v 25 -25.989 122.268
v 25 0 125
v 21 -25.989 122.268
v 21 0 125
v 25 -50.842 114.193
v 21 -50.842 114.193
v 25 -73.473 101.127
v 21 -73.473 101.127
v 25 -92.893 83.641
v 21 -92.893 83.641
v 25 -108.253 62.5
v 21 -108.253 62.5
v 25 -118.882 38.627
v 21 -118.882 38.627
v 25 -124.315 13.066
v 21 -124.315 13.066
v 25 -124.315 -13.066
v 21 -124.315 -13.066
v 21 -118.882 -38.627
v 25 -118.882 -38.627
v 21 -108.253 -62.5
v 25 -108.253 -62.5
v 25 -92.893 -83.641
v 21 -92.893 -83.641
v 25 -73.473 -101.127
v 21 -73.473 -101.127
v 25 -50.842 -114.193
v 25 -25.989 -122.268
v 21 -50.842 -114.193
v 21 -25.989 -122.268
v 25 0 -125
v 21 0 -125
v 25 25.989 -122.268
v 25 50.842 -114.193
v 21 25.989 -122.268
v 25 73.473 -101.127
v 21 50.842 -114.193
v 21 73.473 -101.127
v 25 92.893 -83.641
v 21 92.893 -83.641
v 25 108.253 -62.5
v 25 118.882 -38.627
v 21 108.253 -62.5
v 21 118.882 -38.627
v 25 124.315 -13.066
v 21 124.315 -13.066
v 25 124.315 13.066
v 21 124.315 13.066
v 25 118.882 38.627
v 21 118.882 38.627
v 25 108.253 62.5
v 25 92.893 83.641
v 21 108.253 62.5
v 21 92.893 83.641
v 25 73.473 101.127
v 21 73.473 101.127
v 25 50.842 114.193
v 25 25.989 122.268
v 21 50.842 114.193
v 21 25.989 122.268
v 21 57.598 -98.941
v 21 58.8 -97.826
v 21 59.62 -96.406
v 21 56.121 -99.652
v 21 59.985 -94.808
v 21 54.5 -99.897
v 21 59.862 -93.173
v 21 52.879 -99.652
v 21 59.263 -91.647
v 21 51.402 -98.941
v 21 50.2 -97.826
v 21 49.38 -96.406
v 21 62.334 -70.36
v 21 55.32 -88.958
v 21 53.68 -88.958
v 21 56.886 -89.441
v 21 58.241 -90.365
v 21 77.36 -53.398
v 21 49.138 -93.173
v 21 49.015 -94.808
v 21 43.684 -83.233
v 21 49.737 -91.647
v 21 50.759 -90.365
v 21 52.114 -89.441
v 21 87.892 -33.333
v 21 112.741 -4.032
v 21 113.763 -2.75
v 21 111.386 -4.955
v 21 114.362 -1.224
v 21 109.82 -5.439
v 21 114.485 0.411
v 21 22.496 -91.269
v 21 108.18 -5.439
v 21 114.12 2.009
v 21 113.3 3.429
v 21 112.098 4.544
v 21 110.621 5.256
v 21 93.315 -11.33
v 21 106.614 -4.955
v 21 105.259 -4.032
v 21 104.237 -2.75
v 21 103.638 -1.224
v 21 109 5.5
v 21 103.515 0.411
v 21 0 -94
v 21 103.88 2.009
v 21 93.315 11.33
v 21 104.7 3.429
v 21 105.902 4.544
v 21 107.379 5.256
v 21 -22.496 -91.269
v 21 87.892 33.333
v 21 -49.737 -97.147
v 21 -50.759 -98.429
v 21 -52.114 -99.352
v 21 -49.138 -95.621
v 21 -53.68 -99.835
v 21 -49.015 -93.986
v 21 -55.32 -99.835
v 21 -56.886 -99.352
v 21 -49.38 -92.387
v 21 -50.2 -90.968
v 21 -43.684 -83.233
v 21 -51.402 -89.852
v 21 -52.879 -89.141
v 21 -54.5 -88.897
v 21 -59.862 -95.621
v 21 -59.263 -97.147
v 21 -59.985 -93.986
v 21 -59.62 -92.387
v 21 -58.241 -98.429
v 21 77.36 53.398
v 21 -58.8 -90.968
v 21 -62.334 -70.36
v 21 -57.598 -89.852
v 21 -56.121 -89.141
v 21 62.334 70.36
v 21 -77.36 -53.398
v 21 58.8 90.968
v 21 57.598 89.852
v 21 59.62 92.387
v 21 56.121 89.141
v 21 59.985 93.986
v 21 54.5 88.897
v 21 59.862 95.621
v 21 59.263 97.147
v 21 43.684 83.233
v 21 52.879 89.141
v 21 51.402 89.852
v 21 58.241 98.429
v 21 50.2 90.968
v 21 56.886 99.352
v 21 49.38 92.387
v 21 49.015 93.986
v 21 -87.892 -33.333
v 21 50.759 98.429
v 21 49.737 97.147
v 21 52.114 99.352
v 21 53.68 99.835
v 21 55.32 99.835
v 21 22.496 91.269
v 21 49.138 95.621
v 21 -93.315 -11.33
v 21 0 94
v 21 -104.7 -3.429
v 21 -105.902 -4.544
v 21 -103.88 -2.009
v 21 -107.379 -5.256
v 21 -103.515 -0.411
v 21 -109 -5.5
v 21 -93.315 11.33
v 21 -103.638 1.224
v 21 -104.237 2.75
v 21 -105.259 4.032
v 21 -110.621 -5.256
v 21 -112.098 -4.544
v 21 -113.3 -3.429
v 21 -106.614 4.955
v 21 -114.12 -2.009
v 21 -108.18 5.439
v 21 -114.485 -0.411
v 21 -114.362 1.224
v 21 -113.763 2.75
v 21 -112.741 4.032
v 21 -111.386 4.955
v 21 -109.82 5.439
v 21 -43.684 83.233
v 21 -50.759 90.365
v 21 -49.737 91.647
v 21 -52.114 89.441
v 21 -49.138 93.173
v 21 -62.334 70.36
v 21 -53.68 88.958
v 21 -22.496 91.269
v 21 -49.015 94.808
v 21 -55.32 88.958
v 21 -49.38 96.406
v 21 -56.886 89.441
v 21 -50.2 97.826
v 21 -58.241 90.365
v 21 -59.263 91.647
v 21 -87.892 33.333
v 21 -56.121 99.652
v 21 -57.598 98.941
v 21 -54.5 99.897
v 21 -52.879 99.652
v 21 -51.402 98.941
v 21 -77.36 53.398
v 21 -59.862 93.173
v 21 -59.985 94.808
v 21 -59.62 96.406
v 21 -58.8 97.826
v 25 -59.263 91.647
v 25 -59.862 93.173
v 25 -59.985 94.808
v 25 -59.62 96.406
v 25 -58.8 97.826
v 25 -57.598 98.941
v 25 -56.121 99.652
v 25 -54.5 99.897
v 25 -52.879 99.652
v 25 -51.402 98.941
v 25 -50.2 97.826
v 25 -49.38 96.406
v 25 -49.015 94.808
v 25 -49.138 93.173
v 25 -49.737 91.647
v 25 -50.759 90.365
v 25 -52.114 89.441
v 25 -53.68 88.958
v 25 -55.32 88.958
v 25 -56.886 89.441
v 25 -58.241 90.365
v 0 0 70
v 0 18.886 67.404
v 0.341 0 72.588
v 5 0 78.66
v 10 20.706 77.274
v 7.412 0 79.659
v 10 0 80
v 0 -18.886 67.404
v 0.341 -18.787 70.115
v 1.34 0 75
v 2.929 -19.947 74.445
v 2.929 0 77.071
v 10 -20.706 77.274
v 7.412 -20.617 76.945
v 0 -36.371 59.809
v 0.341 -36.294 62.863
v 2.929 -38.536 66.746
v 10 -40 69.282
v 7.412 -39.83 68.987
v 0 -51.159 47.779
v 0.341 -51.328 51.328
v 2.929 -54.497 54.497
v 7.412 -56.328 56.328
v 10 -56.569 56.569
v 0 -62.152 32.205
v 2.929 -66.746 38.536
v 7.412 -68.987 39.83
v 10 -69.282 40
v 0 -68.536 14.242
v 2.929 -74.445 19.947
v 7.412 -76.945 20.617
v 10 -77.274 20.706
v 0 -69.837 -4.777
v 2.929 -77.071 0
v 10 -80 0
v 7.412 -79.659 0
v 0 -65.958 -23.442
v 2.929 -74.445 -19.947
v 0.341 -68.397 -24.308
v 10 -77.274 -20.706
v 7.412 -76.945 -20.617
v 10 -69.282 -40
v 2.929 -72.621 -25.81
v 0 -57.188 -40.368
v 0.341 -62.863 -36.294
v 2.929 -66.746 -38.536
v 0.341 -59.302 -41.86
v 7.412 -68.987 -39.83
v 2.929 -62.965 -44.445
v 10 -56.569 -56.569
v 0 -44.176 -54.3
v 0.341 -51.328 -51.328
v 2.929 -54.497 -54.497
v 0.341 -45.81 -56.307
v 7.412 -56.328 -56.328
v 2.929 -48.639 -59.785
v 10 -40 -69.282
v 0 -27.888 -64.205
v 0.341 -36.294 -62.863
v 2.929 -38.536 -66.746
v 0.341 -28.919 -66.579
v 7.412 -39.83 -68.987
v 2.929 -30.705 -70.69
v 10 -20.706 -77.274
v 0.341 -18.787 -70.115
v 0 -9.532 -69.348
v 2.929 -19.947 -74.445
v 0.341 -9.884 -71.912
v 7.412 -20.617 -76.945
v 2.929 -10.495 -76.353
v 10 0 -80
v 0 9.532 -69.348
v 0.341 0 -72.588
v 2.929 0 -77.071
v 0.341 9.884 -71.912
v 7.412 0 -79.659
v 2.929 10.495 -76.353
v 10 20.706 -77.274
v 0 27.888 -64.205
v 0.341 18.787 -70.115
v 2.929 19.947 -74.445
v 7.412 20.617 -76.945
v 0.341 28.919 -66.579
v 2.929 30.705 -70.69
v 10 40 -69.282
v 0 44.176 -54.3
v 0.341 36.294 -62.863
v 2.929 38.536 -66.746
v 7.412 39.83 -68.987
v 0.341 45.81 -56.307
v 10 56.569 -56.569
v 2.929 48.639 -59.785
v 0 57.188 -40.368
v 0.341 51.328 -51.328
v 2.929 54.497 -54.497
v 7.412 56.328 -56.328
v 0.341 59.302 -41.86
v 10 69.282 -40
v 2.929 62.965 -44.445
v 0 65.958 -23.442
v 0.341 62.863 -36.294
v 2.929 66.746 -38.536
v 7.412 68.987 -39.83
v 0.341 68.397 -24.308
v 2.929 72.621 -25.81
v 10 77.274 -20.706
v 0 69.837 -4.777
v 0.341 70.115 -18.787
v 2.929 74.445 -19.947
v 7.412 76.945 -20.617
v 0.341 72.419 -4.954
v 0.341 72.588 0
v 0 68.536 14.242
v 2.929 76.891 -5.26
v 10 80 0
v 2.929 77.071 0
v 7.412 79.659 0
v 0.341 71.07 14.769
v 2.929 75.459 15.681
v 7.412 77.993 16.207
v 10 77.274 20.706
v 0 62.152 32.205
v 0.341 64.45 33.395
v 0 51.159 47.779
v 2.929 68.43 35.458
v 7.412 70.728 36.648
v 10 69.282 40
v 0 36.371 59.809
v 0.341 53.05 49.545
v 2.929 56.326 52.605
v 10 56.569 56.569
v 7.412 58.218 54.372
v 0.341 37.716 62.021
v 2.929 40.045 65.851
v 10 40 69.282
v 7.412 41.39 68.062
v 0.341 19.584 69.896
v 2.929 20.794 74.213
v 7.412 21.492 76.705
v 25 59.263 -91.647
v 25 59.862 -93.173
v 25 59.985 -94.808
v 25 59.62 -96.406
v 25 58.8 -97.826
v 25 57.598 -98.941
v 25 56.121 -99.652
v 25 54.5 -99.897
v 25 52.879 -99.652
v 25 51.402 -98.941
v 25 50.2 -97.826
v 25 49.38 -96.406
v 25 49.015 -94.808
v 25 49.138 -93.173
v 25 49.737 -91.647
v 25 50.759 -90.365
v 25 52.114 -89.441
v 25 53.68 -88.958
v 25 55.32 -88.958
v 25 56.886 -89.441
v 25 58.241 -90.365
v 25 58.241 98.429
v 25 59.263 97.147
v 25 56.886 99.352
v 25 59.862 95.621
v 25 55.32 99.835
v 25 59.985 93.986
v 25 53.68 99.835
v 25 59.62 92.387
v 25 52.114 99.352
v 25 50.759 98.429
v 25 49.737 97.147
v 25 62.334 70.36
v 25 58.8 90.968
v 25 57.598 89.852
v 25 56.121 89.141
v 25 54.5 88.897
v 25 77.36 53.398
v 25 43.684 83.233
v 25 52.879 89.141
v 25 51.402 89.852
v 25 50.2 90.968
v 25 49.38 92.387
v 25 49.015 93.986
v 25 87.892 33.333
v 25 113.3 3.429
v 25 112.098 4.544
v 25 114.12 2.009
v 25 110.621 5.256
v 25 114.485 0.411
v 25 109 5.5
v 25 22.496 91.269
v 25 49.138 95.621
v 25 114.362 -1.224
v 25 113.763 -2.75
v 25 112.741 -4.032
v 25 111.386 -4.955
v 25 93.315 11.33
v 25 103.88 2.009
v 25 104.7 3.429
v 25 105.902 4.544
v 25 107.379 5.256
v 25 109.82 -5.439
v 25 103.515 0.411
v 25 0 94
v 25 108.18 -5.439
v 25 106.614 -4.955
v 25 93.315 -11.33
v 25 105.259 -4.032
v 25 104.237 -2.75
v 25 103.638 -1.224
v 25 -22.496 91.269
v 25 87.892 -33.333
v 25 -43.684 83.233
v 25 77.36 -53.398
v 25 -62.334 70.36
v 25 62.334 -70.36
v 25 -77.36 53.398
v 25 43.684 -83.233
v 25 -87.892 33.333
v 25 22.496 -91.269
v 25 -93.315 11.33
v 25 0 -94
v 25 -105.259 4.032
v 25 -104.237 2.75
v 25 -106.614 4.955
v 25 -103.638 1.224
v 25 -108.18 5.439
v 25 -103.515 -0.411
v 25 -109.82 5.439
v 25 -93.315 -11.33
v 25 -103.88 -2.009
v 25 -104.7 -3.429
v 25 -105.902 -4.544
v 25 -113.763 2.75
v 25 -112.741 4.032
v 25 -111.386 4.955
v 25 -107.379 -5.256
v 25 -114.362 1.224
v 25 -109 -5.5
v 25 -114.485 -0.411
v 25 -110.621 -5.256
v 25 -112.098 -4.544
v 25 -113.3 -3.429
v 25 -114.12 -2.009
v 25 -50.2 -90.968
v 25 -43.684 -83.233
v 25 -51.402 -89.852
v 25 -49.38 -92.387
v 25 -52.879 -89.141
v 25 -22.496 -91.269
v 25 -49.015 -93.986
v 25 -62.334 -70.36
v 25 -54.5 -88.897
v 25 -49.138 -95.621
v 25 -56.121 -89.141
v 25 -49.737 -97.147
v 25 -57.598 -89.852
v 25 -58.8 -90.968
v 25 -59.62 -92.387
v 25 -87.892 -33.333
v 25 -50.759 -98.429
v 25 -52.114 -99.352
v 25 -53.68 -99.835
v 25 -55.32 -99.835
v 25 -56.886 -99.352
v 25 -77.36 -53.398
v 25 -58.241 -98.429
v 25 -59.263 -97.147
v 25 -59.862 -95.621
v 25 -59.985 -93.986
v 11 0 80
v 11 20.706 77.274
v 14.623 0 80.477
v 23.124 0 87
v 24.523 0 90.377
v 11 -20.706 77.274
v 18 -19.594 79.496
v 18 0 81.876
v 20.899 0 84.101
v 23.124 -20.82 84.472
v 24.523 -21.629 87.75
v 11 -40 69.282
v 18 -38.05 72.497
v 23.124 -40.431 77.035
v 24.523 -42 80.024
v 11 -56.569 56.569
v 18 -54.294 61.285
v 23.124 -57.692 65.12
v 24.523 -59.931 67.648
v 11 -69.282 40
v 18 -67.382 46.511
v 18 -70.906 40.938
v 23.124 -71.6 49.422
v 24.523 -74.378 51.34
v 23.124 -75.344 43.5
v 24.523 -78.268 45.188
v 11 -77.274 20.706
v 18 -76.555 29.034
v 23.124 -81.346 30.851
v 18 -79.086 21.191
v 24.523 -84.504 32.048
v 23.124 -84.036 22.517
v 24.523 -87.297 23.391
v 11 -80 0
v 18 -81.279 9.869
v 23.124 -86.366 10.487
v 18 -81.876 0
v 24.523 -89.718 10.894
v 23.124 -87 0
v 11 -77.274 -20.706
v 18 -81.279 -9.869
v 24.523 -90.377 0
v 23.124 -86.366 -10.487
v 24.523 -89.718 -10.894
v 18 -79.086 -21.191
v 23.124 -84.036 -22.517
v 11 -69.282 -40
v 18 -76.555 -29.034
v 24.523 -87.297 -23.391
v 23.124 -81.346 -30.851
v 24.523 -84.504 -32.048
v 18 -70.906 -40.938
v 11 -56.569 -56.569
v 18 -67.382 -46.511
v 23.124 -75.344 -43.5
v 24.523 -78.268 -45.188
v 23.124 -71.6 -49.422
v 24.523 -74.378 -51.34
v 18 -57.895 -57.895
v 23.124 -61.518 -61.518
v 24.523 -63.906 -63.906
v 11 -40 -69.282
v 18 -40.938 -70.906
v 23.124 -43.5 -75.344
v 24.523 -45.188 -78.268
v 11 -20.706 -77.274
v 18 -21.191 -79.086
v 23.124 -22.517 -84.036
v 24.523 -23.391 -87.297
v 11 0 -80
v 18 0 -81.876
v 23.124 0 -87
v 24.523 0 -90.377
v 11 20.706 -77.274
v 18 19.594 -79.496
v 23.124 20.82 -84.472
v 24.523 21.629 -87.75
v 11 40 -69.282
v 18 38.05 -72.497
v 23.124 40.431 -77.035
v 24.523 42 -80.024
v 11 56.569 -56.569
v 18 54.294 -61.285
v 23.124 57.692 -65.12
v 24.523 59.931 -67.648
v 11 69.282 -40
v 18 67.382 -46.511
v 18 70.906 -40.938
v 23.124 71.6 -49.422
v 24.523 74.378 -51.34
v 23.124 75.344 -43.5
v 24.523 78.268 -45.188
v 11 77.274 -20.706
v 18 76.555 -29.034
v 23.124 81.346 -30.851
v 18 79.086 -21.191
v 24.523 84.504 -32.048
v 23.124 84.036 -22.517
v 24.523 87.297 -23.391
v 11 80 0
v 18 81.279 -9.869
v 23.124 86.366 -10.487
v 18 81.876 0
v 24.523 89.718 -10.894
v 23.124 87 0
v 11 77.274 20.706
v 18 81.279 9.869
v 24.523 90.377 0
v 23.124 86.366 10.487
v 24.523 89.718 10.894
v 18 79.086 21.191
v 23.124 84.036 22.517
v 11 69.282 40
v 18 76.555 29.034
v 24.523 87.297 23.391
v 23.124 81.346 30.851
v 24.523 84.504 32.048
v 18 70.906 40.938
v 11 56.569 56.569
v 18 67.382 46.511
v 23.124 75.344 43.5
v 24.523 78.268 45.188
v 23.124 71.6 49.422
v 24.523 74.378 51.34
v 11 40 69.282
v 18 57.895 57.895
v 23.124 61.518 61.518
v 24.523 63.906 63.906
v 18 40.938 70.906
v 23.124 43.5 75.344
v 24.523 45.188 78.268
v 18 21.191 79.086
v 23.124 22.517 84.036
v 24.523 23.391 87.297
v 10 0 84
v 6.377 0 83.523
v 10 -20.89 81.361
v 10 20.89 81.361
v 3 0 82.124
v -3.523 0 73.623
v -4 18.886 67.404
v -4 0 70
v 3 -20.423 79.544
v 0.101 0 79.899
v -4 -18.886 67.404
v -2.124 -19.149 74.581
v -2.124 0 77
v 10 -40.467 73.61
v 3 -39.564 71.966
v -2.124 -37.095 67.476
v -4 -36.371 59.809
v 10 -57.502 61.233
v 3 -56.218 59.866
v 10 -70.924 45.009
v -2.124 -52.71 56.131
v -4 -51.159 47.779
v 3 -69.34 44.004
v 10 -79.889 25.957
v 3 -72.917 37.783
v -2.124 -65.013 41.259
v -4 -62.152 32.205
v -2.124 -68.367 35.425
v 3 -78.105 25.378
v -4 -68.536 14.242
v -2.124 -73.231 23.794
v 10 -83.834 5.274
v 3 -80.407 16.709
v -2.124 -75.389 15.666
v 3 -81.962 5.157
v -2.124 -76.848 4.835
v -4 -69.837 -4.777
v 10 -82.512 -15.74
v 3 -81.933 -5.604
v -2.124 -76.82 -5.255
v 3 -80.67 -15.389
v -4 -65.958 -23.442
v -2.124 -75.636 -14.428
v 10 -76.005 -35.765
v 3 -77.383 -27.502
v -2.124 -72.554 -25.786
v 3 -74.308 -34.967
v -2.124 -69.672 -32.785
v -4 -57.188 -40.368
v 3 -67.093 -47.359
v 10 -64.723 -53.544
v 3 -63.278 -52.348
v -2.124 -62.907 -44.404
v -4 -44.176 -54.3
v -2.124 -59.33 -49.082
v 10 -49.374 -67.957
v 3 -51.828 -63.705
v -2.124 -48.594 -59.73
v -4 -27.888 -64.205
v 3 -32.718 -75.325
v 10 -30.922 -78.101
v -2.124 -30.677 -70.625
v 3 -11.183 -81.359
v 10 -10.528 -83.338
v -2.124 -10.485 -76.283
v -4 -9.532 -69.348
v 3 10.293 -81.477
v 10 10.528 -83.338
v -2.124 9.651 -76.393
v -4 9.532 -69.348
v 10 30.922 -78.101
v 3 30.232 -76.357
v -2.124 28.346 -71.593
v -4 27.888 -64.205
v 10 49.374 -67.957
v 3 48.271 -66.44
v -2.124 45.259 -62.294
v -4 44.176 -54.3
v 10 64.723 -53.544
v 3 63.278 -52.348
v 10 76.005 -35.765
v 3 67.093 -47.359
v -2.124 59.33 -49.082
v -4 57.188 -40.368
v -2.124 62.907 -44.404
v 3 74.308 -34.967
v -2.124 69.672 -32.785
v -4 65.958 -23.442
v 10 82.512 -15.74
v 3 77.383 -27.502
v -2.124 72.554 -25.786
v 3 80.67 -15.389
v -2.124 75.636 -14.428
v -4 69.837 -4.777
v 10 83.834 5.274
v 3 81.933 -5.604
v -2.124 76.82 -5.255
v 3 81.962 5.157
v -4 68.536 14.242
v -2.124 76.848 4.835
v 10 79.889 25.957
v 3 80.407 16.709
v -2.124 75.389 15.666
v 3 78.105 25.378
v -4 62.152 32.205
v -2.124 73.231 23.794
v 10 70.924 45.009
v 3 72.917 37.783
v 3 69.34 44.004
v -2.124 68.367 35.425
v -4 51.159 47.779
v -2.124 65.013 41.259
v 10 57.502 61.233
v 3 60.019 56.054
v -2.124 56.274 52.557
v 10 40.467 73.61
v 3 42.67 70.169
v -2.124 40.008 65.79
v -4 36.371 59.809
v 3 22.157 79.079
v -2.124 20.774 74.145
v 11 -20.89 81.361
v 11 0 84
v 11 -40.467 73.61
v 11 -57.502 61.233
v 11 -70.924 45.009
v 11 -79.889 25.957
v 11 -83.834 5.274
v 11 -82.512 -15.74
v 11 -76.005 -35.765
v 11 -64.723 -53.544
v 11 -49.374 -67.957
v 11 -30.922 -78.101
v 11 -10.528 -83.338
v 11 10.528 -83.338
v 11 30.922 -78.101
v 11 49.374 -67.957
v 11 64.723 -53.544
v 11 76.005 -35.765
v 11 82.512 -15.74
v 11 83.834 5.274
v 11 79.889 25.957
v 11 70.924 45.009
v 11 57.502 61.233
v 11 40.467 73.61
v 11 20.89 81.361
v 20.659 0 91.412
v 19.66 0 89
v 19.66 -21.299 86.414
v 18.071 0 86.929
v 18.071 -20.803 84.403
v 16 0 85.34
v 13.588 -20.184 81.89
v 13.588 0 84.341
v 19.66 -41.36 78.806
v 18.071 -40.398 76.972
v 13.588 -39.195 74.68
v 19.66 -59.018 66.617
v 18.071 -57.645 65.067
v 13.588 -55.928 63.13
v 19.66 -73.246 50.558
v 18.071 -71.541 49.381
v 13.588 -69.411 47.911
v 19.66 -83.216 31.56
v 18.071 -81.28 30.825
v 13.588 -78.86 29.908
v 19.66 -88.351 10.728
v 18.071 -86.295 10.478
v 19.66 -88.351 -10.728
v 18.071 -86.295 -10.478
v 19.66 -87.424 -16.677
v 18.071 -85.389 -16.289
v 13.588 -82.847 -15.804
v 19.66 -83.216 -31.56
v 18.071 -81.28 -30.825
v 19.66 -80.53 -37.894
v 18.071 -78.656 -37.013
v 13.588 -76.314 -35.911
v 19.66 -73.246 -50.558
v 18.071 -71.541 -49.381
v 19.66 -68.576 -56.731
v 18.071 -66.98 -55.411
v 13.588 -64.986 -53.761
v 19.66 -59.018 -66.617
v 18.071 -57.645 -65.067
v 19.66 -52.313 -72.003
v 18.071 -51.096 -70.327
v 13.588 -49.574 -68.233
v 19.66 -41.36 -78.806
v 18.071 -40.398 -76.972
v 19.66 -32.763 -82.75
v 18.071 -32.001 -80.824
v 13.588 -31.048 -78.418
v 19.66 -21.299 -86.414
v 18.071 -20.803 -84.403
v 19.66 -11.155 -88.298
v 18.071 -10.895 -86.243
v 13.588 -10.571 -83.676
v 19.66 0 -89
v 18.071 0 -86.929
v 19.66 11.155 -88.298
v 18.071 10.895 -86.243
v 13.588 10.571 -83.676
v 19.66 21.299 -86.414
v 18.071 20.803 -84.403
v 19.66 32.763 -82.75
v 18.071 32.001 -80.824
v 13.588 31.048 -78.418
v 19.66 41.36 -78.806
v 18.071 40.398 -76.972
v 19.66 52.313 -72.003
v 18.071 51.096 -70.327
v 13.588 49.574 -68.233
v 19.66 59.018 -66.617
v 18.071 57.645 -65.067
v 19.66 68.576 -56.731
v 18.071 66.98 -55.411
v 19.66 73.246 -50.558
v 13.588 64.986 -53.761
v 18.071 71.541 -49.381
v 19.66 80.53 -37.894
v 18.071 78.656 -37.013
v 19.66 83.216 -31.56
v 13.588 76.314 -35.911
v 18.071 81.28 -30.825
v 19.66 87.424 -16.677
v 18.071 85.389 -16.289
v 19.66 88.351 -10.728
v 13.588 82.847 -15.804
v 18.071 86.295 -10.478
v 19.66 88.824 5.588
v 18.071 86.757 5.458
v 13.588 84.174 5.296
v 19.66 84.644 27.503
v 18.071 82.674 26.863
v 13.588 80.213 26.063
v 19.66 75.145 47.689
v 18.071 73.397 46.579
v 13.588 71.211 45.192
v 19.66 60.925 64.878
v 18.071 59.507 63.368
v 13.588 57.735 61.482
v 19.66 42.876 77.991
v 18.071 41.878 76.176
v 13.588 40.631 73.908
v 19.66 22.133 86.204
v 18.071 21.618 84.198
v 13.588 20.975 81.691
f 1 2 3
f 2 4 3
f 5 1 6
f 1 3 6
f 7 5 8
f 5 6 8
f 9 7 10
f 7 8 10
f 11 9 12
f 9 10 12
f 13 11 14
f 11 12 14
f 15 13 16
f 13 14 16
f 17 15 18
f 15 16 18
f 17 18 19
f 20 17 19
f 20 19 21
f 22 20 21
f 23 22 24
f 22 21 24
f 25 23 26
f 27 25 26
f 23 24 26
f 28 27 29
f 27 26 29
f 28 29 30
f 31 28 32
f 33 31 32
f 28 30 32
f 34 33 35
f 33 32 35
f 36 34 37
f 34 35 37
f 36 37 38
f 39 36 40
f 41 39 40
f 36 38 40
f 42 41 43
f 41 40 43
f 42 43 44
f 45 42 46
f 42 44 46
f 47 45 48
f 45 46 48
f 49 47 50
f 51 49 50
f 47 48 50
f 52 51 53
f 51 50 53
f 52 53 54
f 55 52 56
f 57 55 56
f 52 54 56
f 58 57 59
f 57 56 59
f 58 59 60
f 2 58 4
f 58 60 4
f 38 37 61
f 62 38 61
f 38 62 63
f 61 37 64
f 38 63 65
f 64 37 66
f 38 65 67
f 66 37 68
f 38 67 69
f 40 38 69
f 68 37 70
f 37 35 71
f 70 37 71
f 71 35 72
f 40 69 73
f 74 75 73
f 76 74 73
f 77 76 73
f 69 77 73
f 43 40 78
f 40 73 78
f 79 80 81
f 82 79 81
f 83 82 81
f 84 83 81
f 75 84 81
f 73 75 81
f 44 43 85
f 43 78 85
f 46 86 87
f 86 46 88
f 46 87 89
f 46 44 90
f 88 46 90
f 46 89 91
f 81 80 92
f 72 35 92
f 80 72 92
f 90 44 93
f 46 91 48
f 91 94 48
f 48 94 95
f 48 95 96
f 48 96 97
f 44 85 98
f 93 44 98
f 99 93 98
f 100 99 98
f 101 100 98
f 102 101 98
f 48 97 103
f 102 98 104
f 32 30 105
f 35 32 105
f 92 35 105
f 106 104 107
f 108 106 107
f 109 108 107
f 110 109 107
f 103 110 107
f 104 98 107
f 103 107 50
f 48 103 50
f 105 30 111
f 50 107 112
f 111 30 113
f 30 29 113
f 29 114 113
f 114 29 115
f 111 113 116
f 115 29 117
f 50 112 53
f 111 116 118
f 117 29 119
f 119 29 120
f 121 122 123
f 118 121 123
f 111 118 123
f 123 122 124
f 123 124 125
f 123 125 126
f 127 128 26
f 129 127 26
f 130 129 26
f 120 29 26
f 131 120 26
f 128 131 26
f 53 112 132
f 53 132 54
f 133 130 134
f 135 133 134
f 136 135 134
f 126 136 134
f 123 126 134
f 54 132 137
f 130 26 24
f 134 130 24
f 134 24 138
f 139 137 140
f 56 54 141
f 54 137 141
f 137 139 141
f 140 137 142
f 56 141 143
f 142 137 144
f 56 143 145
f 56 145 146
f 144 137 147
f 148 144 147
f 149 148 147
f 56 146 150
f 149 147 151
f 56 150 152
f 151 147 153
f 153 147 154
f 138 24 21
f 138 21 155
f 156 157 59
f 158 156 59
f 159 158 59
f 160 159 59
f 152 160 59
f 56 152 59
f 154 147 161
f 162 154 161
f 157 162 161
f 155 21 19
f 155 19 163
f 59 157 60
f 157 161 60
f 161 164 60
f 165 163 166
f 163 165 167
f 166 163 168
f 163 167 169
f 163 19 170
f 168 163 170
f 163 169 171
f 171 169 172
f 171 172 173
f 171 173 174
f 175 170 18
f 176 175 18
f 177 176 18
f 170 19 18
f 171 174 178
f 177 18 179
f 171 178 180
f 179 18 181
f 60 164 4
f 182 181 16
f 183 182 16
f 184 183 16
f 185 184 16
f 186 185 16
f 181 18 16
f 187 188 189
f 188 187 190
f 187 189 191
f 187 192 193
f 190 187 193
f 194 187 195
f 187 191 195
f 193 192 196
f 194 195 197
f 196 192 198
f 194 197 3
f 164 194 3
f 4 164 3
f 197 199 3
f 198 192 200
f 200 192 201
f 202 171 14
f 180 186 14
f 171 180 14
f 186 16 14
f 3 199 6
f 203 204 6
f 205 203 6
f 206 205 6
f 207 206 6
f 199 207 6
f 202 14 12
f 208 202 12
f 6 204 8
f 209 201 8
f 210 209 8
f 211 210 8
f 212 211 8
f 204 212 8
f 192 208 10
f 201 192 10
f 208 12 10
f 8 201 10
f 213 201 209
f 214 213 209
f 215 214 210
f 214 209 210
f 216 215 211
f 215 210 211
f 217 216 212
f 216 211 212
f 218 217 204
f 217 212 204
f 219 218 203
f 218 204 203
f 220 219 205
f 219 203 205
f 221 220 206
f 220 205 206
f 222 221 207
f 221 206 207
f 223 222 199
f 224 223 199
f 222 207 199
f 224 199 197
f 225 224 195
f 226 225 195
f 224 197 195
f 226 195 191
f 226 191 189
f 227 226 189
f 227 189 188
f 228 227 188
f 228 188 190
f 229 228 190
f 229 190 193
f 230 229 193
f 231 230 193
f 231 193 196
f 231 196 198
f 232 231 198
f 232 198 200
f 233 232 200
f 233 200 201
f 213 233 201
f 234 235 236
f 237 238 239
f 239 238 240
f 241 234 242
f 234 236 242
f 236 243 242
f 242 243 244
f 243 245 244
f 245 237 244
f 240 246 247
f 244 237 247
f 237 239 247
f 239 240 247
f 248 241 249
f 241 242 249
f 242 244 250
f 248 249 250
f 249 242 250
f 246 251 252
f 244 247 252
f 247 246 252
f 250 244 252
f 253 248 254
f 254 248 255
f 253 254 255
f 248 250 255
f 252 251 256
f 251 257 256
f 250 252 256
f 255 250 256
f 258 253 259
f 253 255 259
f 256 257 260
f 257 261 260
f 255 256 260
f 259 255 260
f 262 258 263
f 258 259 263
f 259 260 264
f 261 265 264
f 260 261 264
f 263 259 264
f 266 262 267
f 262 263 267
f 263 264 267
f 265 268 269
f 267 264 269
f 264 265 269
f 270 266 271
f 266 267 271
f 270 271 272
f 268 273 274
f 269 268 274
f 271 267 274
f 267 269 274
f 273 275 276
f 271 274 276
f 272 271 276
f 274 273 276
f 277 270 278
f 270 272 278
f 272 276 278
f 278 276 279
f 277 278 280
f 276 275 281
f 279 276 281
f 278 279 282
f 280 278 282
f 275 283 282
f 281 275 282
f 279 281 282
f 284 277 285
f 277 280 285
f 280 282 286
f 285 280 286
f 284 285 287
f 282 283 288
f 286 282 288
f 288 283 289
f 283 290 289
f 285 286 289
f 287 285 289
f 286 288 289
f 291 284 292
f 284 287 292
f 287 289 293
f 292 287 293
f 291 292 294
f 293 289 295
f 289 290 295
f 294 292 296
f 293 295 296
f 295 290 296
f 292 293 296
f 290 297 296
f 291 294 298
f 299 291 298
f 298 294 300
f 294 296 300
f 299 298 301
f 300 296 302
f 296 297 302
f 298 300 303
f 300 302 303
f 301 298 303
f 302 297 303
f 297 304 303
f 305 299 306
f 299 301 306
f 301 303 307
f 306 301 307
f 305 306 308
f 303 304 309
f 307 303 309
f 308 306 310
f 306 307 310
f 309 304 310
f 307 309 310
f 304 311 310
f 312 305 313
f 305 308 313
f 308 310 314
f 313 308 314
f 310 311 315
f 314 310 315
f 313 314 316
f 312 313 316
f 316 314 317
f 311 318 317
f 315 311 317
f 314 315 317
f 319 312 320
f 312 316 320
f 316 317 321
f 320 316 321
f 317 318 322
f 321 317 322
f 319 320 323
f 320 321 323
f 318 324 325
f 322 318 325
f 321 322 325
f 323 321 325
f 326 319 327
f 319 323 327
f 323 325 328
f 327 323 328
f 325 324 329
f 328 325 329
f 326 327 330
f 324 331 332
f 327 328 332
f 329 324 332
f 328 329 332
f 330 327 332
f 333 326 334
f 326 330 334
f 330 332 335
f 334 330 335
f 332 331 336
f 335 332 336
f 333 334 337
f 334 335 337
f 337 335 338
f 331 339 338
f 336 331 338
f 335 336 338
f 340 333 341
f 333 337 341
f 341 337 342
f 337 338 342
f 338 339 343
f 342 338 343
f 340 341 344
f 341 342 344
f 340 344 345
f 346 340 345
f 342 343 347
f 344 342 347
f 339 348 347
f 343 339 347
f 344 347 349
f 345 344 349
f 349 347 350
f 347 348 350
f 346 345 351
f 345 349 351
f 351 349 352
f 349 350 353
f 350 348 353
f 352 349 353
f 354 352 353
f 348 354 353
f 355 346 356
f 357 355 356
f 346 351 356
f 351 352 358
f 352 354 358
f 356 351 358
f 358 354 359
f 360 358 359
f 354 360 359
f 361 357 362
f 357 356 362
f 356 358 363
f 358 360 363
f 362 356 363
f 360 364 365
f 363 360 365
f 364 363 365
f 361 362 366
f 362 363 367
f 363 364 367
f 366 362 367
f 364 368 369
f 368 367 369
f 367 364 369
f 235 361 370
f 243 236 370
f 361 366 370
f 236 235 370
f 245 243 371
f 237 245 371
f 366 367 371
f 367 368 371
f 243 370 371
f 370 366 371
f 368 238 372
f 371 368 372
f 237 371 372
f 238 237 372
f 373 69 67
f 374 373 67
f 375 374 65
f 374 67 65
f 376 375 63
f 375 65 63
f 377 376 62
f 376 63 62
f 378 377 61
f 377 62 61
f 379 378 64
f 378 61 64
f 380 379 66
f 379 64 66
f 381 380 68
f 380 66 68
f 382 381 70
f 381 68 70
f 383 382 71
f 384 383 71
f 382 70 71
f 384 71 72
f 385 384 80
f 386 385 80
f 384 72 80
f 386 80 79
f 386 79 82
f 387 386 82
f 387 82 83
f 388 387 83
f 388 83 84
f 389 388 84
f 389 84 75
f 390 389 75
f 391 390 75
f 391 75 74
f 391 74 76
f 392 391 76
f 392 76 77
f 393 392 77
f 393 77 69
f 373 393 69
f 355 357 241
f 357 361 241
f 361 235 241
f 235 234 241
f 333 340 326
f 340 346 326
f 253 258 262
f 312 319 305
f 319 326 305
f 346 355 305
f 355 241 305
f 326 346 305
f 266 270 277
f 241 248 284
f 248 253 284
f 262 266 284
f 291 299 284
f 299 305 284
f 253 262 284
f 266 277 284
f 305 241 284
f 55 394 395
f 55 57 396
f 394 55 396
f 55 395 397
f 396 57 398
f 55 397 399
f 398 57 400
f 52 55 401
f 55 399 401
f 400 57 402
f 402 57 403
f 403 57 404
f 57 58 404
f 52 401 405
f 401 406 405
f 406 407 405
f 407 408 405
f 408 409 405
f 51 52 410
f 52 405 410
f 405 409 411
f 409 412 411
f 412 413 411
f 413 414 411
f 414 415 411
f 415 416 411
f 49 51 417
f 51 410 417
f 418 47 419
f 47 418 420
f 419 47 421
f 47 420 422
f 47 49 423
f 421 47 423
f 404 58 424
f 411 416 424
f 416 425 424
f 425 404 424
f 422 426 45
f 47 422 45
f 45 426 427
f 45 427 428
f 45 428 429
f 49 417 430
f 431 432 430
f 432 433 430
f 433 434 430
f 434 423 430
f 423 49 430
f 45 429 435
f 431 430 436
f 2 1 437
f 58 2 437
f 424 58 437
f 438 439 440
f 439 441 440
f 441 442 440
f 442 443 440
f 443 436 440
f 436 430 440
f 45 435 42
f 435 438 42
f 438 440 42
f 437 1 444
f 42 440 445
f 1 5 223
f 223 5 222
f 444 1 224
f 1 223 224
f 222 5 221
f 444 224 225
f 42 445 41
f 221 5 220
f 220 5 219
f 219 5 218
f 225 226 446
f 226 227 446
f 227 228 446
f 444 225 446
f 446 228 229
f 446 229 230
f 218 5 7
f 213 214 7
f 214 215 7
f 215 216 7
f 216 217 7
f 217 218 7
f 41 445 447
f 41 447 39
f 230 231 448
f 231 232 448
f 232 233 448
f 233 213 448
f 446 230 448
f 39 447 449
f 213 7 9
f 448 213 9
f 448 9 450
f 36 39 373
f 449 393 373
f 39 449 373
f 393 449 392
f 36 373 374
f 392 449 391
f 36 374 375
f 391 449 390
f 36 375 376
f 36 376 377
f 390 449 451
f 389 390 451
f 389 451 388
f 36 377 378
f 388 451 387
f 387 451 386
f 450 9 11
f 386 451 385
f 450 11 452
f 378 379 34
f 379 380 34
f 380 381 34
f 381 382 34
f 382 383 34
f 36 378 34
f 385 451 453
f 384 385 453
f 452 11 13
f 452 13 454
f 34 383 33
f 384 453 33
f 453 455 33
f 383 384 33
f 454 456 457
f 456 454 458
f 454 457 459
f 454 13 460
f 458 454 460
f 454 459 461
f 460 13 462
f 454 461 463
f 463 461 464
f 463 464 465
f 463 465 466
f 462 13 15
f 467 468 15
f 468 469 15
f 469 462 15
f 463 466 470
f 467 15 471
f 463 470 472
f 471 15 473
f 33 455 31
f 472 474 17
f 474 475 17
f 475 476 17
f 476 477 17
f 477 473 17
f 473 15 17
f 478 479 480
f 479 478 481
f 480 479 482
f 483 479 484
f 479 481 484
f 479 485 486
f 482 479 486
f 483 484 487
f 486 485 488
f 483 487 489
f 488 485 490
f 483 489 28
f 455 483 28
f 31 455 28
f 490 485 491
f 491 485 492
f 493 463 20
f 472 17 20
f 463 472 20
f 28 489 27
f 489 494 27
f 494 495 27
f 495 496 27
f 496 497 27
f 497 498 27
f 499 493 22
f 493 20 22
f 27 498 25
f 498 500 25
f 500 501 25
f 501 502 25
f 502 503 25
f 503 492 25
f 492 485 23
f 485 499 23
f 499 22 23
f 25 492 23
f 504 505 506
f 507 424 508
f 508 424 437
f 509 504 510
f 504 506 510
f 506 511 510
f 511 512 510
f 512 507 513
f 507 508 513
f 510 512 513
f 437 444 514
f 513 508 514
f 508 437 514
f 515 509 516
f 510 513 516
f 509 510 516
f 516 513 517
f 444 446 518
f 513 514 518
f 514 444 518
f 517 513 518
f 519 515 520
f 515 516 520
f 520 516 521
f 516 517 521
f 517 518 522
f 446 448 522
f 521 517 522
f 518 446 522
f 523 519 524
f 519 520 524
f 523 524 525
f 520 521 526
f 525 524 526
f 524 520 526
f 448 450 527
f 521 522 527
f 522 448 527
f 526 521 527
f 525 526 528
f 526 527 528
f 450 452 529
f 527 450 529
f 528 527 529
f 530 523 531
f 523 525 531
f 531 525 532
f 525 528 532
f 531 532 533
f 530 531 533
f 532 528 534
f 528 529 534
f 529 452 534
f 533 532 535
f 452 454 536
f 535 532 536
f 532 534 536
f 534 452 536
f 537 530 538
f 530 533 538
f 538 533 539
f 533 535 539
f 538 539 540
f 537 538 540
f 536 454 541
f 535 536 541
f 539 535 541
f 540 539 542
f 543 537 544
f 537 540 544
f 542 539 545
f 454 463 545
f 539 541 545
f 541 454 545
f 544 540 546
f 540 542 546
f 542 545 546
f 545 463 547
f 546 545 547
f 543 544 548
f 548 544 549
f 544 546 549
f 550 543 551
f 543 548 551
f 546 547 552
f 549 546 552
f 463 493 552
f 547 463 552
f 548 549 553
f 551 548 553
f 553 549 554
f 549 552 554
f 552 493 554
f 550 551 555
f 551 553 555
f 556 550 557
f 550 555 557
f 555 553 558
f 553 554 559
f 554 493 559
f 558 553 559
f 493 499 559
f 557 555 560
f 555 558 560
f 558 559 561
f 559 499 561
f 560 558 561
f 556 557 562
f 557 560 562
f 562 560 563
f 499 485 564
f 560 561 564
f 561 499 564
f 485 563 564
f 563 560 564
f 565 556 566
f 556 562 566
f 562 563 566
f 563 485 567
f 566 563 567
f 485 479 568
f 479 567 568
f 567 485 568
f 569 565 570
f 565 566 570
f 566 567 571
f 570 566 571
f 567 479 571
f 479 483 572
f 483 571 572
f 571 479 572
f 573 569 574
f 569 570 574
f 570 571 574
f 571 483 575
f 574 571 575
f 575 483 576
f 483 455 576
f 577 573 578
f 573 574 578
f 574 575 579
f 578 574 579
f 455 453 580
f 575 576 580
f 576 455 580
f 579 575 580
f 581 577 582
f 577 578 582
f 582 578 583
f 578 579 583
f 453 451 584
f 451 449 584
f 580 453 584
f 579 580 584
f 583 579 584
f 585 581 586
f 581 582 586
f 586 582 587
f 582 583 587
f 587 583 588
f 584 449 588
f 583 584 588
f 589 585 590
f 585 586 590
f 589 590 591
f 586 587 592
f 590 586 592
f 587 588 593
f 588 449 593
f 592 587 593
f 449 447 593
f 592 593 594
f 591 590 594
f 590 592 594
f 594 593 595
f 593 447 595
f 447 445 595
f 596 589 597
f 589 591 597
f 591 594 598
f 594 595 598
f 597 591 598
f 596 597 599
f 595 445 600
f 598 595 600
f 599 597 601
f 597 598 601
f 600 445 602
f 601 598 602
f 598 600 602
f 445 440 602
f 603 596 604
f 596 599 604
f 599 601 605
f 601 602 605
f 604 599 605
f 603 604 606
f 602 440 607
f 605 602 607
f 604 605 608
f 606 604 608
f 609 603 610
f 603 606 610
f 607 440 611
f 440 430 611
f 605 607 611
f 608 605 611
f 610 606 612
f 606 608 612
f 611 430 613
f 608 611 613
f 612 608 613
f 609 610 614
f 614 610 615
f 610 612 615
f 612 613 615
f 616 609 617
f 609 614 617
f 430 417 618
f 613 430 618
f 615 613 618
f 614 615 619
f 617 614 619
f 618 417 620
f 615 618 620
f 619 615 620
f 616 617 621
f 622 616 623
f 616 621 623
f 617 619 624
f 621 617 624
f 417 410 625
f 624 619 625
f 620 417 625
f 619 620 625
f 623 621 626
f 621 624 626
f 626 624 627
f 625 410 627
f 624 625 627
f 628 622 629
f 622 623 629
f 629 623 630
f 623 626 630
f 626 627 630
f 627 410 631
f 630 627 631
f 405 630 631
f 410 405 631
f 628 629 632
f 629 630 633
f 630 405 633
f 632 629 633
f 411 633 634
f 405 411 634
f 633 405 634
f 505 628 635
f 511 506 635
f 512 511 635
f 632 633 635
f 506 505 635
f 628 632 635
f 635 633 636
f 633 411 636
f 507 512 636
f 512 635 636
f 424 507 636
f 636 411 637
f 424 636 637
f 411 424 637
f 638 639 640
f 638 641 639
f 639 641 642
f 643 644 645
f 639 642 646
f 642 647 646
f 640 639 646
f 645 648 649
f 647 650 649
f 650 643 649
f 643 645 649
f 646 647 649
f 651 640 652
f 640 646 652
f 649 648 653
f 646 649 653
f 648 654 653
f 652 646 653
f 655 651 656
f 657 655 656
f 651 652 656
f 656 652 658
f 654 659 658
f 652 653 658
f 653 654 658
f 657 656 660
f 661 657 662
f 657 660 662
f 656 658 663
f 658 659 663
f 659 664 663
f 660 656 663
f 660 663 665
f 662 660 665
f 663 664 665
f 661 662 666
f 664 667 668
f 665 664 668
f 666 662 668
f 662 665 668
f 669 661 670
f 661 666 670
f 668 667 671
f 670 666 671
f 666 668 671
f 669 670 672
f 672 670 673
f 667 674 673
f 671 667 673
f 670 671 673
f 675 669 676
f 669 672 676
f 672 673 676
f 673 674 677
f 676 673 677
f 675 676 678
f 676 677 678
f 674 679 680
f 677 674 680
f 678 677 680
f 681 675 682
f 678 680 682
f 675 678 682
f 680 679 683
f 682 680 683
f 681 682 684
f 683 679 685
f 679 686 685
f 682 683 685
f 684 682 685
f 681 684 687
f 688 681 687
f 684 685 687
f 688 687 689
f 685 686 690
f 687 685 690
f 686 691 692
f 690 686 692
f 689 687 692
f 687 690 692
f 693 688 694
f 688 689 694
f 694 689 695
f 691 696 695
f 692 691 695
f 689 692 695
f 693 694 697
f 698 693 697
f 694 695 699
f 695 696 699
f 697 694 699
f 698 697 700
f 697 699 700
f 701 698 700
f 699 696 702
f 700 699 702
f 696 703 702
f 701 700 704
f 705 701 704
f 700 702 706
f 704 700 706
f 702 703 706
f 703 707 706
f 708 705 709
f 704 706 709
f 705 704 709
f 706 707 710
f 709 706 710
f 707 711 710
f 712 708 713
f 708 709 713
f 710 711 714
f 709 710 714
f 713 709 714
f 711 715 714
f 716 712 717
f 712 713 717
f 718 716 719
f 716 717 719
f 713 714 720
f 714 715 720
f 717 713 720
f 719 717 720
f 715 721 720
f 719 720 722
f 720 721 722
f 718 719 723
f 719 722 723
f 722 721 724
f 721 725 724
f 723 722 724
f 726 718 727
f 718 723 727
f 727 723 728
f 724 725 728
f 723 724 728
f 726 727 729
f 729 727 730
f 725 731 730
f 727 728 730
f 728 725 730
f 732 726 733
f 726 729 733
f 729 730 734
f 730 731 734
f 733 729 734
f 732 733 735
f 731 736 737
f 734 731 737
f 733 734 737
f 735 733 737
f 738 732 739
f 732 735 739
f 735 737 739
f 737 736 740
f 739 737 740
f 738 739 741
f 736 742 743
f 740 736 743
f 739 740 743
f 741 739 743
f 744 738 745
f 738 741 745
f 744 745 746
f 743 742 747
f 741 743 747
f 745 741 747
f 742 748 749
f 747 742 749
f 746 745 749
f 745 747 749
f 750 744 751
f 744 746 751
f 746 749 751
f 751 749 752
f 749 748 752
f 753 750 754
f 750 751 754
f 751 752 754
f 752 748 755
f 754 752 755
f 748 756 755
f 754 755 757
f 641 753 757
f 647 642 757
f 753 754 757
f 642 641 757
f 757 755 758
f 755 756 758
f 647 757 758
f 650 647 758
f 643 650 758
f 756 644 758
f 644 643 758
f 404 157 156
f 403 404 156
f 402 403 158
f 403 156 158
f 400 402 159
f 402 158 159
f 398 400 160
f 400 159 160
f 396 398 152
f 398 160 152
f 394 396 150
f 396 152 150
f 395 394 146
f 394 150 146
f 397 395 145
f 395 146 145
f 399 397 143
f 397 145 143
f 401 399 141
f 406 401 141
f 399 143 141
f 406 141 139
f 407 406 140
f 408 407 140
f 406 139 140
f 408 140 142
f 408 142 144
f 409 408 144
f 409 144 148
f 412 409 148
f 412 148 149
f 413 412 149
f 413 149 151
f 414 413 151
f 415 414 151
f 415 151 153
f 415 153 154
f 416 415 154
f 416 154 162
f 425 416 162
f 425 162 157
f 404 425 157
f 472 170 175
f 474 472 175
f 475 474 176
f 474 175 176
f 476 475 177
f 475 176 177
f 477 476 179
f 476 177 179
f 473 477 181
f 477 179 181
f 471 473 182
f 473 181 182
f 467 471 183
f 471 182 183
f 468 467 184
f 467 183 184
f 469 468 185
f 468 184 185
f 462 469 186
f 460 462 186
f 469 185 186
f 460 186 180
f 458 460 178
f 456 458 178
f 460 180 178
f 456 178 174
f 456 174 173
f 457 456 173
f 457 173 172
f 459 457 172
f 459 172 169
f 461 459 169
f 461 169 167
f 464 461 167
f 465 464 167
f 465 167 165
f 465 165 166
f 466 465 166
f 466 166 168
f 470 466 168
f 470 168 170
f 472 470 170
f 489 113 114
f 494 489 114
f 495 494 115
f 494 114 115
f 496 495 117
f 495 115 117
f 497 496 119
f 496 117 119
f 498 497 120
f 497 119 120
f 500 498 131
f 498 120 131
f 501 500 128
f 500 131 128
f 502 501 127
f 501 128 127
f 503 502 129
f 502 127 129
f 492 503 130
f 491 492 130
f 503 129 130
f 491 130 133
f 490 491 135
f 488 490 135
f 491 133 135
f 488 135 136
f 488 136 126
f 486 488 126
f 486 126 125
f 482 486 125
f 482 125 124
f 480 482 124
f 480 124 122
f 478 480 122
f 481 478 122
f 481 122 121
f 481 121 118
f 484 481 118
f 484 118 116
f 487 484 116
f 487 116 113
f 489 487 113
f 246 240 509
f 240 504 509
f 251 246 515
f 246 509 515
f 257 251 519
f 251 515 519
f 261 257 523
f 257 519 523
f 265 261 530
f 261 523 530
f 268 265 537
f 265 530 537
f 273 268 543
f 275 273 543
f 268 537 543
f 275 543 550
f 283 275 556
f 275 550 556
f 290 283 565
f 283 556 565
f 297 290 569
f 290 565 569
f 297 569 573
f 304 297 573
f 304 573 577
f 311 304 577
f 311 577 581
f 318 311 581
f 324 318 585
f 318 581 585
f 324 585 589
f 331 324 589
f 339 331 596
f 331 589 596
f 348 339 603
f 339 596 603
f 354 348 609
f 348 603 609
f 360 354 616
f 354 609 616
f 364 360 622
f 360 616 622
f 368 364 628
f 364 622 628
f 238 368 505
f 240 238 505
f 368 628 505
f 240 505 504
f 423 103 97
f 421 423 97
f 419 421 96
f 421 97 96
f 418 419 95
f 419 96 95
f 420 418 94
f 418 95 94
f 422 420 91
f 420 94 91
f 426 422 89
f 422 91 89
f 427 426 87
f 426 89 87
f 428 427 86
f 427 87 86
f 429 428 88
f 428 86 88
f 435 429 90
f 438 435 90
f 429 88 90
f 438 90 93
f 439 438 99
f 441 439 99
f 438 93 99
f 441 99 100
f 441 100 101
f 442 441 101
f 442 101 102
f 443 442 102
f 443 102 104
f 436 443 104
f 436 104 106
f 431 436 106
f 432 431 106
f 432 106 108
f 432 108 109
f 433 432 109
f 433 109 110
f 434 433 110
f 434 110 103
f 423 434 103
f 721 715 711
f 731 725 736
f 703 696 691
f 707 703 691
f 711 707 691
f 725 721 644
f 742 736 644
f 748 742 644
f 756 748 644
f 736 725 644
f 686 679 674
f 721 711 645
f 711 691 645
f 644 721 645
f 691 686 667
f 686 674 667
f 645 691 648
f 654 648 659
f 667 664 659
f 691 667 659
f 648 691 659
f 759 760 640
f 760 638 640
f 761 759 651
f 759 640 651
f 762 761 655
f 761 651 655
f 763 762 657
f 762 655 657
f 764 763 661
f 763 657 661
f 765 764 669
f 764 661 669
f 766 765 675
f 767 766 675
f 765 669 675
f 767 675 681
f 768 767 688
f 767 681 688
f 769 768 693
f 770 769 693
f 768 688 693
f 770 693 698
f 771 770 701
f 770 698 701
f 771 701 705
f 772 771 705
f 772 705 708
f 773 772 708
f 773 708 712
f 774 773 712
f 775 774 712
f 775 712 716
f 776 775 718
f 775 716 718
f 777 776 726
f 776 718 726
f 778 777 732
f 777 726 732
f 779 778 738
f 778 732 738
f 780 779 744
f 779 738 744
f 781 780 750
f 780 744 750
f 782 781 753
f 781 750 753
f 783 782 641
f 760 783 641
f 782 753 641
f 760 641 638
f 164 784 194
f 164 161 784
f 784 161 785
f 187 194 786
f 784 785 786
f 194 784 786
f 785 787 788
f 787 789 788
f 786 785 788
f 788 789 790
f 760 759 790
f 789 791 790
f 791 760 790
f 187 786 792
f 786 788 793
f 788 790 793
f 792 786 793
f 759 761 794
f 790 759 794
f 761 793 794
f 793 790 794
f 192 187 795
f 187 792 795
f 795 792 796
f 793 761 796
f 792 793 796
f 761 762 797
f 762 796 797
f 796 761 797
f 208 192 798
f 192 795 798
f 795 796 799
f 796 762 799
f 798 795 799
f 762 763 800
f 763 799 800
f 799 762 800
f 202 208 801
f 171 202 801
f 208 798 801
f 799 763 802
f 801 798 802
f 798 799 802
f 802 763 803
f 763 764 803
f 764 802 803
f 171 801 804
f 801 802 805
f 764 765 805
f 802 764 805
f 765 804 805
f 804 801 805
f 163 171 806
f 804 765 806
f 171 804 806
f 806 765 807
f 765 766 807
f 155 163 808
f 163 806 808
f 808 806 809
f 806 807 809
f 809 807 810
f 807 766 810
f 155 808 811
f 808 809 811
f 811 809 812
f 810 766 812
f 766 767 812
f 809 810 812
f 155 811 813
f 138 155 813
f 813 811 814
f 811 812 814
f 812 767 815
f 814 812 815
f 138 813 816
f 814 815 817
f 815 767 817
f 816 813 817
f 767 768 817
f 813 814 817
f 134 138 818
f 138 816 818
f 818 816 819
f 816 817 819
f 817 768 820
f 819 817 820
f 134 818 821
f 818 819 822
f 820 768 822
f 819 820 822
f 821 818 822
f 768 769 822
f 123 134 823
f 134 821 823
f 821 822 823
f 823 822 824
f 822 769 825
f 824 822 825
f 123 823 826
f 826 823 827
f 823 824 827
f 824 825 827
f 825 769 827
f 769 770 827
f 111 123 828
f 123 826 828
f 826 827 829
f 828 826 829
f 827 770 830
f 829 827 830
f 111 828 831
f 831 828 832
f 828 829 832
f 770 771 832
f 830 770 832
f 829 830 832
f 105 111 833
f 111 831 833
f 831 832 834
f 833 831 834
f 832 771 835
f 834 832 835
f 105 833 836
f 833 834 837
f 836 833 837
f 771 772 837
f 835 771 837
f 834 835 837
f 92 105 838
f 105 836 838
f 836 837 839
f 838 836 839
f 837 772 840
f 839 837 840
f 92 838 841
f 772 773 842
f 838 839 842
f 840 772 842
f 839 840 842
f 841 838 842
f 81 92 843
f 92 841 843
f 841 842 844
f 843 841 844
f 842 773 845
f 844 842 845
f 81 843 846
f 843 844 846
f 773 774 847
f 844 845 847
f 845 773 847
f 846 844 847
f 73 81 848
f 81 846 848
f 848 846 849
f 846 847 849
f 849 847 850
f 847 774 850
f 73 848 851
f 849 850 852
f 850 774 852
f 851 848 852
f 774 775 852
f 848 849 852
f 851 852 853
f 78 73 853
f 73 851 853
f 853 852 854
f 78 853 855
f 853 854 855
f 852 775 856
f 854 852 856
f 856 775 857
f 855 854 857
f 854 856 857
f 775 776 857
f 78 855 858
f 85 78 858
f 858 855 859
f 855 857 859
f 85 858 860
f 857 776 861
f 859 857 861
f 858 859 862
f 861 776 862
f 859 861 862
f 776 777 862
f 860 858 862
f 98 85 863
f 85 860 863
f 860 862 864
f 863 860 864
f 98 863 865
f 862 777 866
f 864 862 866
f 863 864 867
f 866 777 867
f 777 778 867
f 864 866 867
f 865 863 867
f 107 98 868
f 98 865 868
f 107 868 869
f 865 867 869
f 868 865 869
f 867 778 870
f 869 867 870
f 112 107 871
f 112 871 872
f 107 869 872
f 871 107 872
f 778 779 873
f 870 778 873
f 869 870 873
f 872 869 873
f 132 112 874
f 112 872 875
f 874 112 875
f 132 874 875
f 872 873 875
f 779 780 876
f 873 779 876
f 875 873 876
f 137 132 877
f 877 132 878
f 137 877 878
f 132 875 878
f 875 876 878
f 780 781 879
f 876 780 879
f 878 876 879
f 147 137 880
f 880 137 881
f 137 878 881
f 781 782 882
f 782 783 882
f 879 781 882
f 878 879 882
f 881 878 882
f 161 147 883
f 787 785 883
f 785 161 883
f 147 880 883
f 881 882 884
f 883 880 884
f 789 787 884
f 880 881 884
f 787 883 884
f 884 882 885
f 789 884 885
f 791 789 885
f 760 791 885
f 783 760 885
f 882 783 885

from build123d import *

# Parameters (mm, degrees)
SKETCH2_R          = 5.5
CUT_EXTRUDE1_DEPTH = 179.535710728
CIRPATTERN1_COUNT  = 6


with BuildPart() as part:
    # Sketch1 → Revolve1 (revolve)
    with BuildSketch(Plane.XY, mode=Mode.PRIVATE) as revolve1_sk:
        with BuildLine():
            Line((0, 0), (0, 70))
            ThreePointArc((0, 70), (2.928932188, 77.071067812), (10, 80))
            Line((10, 80), (11, 80))
            ThreePointArc((11, 80), (20.899494937, 84.100505063), (25, 94))
            Line((25, 94), (25, 125))
            Line((25, 125), (21, 125))
            Line((21, 125), (21, 94))
            ThreePointArc((21, 94), (18.071067812, 86.928932188), (11, 84))
            Line((11, 84), (10, 84))
            ThreePointArc((10, 84), (0.100505063, 79.899494937), (-4, 70))
            Line((-4, 70), (-4, 0))
            Line((-4, 0), (0, 0))
        make_face()
    revolve(revolve1_sk.sketch.rotate(Axis((-4, 0, 0), (1, 0, 0)), 90), axis=Axis((-4, 0, 0), (1, 0, 0)))

    # Sketch2 → Cut-Extrude1 (cut, through all)
    with BuildSketch(Plane.ZY.offset(-21)):
        with Locations((0, 109)):
            Circle(SKETCH2_R)
    cut_extrude1 = extrude(amount=-CUT_EXTRUDE1_DEPTH, mode=Mode.SUBTRACT)

    # CirPattern1: Cut-Extrude1 ×6 about axis
    cirpattern1_axis = Axis((0, 0, 0), (1, 0, 0))
    for i in range(1, CIRPATTERN1_COUNT):
        add(cut_extrude1.rotate(cirpattern1_axis, i * 360 / CIRPATTERN1_COUNT), mode=Mode.SUBTRACT)


solid = part.part
